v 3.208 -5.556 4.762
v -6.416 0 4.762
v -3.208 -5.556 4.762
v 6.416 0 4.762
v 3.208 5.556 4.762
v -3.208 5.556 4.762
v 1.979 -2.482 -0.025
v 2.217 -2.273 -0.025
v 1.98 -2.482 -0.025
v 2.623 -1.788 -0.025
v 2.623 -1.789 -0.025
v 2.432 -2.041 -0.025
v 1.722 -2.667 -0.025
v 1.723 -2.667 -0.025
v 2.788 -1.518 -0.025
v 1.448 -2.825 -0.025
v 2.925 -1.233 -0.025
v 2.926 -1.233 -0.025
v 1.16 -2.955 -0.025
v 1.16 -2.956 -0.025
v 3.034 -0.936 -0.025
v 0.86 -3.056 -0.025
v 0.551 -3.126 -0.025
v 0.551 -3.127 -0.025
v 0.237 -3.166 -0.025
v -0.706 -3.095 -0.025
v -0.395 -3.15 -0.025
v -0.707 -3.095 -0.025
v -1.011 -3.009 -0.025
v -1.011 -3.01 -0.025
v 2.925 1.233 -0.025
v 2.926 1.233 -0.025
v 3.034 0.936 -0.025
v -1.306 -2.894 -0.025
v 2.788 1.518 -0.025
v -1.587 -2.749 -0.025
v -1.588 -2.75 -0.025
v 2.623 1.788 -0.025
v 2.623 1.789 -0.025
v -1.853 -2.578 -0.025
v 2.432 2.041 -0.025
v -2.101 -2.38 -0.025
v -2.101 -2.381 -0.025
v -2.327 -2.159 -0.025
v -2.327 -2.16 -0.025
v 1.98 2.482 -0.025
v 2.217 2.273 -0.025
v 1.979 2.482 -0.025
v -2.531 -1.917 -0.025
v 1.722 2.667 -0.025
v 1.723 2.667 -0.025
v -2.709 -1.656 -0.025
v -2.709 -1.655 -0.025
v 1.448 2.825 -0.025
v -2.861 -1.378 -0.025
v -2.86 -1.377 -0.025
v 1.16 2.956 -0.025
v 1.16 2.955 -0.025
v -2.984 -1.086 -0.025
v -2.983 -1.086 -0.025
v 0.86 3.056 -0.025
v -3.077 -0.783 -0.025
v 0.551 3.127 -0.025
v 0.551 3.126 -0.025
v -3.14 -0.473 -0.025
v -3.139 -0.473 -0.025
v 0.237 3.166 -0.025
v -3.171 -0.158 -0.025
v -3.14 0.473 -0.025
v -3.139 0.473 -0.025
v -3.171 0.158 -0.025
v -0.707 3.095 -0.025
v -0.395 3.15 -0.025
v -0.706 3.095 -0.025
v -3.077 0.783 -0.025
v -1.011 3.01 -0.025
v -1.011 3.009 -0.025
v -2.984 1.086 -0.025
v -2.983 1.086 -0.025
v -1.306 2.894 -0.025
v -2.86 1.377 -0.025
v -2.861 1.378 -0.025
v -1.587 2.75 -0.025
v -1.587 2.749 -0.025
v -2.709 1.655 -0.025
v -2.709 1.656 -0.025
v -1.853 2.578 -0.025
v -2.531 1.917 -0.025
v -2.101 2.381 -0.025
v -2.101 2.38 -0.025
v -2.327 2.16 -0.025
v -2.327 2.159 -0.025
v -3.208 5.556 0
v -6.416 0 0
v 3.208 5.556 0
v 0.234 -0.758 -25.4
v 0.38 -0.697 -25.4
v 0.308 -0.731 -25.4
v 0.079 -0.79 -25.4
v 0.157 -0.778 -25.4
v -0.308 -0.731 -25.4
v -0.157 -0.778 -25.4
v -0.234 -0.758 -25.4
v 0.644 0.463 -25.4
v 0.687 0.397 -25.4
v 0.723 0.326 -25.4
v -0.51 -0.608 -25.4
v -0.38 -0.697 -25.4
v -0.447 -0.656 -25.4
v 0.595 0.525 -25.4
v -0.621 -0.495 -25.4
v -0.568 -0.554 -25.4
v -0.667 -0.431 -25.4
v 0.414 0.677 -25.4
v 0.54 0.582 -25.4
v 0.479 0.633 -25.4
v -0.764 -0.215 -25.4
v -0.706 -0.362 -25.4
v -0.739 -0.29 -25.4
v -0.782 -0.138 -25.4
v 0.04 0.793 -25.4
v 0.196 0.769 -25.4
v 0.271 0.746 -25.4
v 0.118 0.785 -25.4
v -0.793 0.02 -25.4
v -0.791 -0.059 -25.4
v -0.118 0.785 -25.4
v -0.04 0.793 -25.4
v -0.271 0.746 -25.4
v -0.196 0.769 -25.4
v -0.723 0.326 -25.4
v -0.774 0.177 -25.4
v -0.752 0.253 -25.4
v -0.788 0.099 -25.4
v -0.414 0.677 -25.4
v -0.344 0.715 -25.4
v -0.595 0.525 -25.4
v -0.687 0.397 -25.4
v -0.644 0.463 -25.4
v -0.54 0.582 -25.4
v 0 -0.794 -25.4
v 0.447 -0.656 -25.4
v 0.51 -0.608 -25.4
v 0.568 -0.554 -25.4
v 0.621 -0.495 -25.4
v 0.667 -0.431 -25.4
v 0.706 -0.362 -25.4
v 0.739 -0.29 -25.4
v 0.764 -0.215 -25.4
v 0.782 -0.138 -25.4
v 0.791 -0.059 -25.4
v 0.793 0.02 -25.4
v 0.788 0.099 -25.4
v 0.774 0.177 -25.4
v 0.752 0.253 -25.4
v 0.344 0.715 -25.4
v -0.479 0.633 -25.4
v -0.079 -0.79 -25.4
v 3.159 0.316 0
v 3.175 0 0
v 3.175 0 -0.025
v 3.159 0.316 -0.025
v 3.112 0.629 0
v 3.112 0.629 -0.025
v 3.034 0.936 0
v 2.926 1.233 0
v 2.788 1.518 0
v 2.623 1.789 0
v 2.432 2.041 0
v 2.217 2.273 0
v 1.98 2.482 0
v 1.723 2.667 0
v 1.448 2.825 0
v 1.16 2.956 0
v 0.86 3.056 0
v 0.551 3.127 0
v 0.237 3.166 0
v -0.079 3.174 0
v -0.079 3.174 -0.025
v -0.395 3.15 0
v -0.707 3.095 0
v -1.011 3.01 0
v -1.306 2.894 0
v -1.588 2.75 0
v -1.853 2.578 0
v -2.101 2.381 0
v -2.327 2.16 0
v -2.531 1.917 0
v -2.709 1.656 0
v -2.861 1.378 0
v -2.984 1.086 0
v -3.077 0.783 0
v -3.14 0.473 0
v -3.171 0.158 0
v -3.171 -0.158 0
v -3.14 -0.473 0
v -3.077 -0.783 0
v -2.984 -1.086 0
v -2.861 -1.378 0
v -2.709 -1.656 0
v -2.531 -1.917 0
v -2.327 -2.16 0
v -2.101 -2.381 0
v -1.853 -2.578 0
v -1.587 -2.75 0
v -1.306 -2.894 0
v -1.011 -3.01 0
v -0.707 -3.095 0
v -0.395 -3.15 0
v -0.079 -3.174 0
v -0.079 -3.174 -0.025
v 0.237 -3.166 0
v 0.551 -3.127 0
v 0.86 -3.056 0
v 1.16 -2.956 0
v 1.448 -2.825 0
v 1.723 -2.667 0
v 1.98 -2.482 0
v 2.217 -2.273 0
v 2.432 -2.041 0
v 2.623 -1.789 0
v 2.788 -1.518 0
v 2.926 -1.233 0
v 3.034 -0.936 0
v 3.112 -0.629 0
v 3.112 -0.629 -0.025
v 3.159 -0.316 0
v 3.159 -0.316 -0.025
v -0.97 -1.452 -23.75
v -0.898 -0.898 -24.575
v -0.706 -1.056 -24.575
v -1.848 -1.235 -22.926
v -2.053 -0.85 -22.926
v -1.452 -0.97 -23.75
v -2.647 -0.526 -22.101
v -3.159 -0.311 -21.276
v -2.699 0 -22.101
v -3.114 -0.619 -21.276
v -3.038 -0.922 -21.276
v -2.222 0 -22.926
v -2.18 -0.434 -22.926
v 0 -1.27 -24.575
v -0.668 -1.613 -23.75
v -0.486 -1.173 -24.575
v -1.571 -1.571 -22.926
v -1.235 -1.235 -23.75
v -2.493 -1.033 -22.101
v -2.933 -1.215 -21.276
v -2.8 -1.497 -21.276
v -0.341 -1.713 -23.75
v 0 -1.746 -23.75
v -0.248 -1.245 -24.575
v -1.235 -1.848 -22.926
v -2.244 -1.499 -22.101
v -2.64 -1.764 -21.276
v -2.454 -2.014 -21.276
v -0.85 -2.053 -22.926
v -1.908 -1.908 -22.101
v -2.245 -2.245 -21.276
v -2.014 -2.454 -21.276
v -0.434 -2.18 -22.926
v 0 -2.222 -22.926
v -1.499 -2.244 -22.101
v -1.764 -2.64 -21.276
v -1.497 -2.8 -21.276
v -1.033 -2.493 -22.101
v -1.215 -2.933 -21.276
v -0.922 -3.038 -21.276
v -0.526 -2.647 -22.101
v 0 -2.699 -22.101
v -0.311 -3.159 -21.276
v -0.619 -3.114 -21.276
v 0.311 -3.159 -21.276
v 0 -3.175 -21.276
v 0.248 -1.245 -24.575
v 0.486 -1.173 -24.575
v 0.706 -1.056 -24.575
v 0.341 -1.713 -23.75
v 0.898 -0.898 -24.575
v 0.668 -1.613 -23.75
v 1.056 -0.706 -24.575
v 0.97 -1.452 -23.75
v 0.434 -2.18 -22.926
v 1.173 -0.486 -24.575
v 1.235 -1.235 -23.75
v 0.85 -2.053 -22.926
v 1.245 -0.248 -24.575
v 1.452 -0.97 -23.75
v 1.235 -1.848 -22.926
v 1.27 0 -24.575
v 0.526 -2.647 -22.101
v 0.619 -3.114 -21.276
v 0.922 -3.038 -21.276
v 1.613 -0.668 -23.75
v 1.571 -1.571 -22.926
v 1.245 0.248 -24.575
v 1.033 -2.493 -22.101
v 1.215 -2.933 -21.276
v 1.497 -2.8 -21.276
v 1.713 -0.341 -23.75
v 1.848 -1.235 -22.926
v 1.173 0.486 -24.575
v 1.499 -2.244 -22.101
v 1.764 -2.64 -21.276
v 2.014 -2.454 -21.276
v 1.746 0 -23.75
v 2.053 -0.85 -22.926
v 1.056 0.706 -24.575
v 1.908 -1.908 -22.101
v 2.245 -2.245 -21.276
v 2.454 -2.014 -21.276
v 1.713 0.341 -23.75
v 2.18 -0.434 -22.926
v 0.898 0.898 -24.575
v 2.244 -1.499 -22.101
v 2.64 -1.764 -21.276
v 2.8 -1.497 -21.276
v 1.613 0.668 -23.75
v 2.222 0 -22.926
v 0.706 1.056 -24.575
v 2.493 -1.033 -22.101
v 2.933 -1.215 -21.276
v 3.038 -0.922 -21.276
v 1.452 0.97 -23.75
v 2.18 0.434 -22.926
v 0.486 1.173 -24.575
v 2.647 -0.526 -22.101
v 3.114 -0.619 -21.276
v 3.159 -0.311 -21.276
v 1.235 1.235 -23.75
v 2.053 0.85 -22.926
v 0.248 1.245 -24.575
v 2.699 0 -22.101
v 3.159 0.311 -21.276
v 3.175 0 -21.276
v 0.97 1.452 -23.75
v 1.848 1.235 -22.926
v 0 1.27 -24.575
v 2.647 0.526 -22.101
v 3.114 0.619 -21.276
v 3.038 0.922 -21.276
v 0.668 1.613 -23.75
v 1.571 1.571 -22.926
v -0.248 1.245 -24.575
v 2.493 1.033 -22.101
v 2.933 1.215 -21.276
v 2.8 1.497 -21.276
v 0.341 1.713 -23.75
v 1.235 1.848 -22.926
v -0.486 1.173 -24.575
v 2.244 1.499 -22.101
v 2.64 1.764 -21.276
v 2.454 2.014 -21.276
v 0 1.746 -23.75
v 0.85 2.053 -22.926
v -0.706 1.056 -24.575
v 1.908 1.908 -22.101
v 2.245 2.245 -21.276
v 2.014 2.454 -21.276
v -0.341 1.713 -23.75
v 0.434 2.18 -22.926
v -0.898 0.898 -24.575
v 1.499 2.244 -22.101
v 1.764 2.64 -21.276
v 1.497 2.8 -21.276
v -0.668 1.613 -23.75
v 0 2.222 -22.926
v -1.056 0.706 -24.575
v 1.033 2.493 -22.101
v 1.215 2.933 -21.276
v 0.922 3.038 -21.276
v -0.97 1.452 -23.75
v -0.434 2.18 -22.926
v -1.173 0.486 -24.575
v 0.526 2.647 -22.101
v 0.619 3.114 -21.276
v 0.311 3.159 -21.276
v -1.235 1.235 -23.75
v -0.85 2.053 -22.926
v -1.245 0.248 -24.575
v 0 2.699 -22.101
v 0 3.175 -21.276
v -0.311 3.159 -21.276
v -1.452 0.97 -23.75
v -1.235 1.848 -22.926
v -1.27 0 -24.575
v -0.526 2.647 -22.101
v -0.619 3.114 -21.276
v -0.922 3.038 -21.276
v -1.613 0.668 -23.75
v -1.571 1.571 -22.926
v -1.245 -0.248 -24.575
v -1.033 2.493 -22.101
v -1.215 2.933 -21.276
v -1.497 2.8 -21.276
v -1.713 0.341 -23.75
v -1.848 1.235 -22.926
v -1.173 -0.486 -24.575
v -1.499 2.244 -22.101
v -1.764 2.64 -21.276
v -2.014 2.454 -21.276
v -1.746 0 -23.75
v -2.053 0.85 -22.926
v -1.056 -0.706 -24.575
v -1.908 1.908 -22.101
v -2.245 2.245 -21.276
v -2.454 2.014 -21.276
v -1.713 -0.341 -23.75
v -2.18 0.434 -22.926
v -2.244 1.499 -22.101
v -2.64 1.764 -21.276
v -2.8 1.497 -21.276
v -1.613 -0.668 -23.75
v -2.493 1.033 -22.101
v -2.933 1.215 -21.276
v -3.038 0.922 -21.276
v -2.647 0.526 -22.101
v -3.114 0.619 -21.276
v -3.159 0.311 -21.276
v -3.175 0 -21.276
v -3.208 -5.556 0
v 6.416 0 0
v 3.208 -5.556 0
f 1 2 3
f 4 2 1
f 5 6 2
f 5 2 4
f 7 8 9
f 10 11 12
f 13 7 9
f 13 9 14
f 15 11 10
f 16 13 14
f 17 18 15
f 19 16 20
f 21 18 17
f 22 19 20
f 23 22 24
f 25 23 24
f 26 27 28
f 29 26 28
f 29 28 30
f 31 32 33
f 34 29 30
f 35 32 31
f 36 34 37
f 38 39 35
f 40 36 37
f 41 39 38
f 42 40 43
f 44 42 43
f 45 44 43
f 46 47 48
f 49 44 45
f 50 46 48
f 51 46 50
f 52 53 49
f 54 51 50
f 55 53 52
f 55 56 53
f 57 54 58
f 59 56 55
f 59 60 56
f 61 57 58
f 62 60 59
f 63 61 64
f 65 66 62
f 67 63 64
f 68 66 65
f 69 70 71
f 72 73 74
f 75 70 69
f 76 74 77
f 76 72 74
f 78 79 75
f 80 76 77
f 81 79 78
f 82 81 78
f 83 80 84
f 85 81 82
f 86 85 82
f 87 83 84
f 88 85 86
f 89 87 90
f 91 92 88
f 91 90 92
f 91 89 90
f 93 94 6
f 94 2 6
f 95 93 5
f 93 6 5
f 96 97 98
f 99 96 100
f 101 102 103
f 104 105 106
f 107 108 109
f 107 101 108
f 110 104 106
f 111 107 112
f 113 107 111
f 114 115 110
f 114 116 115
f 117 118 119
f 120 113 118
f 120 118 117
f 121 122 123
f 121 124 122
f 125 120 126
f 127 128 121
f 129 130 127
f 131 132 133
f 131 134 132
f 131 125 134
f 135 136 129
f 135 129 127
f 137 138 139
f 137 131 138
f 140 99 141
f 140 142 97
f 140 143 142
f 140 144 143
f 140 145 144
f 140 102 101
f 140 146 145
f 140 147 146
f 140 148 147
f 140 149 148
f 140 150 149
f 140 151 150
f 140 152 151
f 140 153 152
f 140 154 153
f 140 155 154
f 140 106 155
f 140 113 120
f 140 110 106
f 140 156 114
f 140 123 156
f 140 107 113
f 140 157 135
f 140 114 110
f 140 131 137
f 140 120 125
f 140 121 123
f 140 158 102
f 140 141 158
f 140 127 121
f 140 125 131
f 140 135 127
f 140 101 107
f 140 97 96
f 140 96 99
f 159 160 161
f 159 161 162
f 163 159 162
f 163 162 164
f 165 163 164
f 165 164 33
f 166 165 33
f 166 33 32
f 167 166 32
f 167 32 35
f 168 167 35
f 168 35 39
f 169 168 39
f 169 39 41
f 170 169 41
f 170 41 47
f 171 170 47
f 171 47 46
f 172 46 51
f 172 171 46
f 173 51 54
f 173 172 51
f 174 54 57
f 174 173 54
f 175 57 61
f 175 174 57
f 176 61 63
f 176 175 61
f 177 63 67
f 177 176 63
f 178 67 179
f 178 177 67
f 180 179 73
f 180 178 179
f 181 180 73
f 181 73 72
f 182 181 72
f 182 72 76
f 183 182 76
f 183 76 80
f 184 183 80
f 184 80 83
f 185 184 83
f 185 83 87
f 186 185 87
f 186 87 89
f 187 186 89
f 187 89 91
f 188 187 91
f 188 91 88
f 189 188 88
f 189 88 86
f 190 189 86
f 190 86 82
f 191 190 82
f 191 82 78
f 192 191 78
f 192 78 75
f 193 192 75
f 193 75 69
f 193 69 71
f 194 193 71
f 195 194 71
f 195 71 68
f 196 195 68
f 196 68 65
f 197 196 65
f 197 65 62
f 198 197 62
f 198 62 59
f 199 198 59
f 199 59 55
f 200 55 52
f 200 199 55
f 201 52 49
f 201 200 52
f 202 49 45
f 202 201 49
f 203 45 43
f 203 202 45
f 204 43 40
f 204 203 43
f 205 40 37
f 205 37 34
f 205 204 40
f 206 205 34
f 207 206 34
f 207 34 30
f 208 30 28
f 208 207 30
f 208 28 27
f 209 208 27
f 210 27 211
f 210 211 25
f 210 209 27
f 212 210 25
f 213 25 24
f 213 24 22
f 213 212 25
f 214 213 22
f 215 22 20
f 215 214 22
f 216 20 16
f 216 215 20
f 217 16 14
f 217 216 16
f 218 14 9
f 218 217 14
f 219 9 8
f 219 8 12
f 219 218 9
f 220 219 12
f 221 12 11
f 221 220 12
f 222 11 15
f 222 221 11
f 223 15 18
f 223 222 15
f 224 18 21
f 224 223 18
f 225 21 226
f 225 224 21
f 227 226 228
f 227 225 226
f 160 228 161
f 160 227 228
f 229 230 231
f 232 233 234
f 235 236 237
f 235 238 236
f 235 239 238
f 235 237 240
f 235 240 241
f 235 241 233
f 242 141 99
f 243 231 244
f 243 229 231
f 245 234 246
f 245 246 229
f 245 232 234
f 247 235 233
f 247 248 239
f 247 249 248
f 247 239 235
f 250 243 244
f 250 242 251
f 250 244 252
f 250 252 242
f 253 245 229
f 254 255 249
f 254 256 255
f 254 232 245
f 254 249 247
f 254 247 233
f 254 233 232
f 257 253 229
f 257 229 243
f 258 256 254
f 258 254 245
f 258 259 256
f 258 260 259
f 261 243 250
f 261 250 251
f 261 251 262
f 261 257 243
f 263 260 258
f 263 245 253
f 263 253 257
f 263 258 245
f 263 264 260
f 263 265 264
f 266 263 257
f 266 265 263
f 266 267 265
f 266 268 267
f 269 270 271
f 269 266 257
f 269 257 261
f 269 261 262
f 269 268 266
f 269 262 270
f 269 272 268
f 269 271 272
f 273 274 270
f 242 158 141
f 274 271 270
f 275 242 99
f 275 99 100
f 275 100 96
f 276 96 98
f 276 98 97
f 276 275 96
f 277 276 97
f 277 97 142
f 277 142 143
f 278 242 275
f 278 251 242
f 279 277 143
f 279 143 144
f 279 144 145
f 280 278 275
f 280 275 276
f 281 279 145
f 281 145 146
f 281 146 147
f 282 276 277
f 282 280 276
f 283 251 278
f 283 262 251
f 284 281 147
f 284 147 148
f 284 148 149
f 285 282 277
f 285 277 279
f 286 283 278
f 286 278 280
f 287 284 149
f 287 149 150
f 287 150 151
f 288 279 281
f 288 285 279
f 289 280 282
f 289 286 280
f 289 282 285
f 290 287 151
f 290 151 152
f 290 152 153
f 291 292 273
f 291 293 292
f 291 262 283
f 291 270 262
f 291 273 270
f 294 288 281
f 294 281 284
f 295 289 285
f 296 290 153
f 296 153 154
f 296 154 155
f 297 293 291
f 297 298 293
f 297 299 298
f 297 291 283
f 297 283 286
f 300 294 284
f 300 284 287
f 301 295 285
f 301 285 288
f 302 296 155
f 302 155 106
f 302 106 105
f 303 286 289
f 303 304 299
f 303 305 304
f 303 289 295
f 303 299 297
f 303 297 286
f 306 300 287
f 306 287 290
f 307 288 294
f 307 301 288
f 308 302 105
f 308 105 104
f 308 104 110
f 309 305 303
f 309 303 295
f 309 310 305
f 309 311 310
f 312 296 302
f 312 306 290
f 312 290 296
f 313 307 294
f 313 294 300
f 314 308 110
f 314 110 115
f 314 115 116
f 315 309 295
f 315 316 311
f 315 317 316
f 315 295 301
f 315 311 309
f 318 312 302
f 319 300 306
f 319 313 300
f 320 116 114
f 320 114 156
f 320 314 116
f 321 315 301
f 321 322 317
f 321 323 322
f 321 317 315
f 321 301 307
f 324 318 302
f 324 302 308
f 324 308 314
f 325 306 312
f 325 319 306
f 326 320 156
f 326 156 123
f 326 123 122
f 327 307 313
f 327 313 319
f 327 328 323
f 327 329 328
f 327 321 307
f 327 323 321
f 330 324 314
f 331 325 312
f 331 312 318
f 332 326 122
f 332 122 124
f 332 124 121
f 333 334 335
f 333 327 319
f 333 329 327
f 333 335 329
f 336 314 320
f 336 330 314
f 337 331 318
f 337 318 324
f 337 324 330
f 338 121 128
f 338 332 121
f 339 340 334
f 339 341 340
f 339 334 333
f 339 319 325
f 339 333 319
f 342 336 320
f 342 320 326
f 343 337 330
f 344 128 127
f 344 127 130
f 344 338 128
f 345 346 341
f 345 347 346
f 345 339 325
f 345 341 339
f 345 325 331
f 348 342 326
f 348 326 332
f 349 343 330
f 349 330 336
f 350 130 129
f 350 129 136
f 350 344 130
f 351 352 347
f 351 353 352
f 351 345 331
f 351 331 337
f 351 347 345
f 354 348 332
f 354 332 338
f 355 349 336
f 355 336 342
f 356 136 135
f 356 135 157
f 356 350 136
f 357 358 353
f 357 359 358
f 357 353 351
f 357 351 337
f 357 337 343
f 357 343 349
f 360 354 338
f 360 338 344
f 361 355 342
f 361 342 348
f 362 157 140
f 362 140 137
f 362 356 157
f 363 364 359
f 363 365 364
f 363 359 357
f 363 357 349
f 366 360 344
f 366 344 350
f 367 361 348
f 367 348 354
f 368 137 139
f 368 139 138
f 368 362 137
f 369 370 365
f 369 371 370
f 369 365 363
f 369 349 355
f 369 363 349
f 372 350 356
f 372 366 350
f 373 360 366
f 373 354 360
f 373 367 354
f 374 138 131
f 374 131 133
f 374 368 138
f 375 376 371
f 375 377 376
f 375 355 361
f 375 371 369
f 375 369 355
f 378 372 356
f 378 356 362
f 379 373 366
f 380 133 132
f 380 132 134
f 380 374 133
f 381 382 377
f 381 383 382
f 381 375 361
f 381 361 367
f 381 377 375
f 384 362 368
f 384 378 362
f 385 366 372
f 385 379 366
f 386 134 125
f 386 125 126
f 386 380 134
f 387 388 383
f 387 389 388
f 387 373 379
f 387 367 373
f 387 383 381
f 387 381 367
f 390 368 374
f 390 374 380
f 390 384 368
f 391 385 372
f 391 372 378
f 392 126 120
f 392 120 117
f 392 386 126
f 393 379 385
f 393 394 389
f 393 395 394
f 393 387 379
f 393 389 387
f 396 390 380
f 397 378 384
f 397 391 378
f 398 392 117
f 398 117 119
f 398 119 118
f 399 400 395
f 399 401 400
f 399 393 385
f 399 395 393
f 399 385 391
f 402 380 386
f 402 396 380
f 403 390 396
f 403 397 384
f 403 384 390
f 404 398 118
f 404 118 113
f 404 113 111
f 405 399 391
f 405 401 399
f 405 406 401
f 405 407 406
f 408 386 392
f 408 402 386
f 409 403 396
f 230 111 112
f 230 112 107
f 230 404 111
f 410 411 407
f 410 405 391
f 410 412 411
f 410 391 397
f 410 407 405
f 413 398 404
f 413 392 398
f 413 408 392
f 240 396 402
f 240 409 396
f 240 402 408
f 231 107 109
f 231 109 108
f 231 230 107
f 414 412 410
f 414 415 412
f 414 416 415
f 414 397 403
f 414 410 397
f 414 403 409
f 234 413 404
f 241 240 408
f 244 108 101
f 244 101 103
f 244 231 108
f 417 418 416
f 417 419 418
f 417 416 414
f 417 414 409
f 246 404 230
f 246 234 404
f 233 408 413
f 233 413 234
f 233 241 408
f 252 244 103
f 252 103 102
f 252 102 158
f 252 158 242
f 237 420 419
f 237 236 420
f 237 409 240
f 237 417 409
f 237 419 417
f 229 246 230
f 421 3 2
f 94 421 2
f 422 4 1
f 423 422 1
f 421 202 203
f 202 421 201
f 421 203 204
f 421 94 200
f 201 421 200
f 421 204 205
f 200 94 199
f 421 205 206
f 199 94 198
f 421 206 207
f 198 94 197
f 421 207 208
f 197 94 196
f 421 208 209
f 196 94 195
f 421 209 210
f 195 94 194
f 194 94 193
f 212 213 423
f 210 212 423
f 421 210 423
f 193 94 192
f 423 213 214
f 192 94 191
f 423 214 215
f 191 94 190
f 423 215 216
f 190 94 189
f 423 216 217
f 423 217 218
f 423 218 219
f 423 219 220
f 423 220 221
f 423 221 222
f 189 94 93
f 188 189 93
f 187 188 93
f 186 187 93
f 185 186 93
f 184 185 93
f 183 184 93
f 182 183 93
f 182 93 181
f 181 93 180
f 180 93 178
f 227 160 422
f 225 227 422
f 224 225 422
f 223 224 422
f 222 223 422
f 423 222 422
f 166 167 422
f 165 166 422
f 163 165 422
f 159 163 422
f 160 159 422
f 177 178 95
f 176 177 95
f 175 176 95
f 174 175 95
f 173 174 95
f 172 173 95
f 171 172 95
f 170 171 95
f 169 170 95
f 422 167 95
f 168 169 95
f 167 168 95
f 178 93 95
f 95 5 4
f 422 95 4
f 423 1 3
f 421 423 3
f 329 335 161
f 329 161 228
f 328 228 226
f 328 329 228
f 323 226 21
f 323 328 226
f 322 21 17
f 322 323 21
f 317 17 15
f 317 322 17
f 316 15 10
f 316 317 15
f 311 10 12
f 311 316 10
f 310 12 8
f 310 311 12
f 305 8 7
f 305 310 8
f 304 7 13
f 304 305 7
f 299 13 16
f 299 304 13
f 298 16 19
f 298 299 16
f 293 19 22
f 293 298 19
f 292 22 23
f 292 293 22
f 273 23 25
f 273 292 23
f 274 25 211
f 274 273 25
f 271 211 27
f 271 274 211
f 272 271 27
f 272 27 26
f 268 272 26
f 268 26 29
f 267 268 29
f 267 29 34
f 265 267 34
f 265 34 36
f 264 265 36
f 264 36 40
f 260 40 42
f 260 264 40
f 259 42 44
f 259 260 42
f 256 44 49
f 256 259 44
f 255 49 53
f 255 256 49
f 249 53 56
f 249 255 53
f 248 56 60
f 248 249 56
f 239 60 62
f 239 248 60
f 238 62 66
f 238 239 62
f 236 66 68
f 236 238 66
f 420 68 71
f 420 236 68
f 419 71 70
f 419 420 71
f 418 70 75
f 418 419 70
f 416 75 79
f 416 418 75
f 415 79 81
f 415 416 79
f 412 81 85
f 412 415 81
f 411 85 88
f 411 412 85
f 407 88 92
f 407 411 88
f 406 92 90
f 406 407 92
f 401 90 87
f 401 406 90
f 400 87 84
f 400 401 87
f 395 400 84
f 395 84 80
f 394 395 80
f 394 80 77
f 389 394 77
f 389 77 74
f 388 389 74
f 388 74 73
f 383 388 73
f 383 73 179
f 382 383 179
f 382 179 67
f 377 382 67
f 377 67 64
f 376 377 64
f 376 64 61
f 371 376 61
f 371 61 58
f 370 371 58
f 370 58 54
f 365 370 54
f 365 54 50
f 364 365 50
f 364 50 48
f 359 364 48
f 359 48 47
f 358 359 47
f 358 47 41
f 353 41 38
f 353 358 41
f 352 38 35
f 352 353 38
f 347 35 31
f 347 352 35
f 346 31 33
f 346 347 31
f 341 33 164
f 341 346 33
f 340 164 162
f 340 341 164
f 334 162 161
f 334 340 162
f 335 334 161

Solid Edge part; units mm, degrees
sketch "Sketch1" plane through (0, 0, 0) normal (0, 0, 1) x (1, 0, 0)
  circle A0 centre (0, 0) radius 6.4452
  dimension "D1" = 12.8905
extrude "Protrusion1" add sketch "Sketch1" along normal blind 4.7625
sketch "Sketch2" plane through (0, 0, 0) normal (0, 0, -1) x (1, 0, 0)
  circle A0 centre (0, 0) radius 3.175
extrude "Protrusion2" add sketch "Sketch2" along normal blind 25.4
sketch "Sketch3" plane through (0, 0, -25.4) normal (0, 0, -1) x (1, 0, 0)
  circle A0 centre (0, 0) radius 3.1747
extrude "Cutout1" cut sketch "Sketch3" against normal blind 25.3746 flip side to cut
sketch "Sketch4" plane through (0, 0, 4.7625) normal (0, 0, 1) x (1, 0, 0)
  line L0 (-3.2664, 5.5562) -> (3.2664, 5.5562)
  dimension "D1" = 11.1125
extrude "Cutout2" cut sketch "Sketch4" against normal up to next material side at (0, 5.6062, 4.7625)
sketch "Sketch5" plane through (0, 0, 0) normal (1, 0, 0) x (0, 1, 0)
  line L0 (-0.7937, -25.4) -> (-3.1747, -21.276)
  dimension "D1" = 0.7937
revolve "RevolvedCutout1" cut sketch "Sketch5" angle 360 about axis through (0, 0, -14.7796) along (0, 0, 1) material side at (0, -2.0275, -23.363)
pattern_circular "Pattern1" count 6 over 360 about axis through (0, 0, 4.7625) along (0, 0, 1) of "Cutout2"
properties part number "24100261"
